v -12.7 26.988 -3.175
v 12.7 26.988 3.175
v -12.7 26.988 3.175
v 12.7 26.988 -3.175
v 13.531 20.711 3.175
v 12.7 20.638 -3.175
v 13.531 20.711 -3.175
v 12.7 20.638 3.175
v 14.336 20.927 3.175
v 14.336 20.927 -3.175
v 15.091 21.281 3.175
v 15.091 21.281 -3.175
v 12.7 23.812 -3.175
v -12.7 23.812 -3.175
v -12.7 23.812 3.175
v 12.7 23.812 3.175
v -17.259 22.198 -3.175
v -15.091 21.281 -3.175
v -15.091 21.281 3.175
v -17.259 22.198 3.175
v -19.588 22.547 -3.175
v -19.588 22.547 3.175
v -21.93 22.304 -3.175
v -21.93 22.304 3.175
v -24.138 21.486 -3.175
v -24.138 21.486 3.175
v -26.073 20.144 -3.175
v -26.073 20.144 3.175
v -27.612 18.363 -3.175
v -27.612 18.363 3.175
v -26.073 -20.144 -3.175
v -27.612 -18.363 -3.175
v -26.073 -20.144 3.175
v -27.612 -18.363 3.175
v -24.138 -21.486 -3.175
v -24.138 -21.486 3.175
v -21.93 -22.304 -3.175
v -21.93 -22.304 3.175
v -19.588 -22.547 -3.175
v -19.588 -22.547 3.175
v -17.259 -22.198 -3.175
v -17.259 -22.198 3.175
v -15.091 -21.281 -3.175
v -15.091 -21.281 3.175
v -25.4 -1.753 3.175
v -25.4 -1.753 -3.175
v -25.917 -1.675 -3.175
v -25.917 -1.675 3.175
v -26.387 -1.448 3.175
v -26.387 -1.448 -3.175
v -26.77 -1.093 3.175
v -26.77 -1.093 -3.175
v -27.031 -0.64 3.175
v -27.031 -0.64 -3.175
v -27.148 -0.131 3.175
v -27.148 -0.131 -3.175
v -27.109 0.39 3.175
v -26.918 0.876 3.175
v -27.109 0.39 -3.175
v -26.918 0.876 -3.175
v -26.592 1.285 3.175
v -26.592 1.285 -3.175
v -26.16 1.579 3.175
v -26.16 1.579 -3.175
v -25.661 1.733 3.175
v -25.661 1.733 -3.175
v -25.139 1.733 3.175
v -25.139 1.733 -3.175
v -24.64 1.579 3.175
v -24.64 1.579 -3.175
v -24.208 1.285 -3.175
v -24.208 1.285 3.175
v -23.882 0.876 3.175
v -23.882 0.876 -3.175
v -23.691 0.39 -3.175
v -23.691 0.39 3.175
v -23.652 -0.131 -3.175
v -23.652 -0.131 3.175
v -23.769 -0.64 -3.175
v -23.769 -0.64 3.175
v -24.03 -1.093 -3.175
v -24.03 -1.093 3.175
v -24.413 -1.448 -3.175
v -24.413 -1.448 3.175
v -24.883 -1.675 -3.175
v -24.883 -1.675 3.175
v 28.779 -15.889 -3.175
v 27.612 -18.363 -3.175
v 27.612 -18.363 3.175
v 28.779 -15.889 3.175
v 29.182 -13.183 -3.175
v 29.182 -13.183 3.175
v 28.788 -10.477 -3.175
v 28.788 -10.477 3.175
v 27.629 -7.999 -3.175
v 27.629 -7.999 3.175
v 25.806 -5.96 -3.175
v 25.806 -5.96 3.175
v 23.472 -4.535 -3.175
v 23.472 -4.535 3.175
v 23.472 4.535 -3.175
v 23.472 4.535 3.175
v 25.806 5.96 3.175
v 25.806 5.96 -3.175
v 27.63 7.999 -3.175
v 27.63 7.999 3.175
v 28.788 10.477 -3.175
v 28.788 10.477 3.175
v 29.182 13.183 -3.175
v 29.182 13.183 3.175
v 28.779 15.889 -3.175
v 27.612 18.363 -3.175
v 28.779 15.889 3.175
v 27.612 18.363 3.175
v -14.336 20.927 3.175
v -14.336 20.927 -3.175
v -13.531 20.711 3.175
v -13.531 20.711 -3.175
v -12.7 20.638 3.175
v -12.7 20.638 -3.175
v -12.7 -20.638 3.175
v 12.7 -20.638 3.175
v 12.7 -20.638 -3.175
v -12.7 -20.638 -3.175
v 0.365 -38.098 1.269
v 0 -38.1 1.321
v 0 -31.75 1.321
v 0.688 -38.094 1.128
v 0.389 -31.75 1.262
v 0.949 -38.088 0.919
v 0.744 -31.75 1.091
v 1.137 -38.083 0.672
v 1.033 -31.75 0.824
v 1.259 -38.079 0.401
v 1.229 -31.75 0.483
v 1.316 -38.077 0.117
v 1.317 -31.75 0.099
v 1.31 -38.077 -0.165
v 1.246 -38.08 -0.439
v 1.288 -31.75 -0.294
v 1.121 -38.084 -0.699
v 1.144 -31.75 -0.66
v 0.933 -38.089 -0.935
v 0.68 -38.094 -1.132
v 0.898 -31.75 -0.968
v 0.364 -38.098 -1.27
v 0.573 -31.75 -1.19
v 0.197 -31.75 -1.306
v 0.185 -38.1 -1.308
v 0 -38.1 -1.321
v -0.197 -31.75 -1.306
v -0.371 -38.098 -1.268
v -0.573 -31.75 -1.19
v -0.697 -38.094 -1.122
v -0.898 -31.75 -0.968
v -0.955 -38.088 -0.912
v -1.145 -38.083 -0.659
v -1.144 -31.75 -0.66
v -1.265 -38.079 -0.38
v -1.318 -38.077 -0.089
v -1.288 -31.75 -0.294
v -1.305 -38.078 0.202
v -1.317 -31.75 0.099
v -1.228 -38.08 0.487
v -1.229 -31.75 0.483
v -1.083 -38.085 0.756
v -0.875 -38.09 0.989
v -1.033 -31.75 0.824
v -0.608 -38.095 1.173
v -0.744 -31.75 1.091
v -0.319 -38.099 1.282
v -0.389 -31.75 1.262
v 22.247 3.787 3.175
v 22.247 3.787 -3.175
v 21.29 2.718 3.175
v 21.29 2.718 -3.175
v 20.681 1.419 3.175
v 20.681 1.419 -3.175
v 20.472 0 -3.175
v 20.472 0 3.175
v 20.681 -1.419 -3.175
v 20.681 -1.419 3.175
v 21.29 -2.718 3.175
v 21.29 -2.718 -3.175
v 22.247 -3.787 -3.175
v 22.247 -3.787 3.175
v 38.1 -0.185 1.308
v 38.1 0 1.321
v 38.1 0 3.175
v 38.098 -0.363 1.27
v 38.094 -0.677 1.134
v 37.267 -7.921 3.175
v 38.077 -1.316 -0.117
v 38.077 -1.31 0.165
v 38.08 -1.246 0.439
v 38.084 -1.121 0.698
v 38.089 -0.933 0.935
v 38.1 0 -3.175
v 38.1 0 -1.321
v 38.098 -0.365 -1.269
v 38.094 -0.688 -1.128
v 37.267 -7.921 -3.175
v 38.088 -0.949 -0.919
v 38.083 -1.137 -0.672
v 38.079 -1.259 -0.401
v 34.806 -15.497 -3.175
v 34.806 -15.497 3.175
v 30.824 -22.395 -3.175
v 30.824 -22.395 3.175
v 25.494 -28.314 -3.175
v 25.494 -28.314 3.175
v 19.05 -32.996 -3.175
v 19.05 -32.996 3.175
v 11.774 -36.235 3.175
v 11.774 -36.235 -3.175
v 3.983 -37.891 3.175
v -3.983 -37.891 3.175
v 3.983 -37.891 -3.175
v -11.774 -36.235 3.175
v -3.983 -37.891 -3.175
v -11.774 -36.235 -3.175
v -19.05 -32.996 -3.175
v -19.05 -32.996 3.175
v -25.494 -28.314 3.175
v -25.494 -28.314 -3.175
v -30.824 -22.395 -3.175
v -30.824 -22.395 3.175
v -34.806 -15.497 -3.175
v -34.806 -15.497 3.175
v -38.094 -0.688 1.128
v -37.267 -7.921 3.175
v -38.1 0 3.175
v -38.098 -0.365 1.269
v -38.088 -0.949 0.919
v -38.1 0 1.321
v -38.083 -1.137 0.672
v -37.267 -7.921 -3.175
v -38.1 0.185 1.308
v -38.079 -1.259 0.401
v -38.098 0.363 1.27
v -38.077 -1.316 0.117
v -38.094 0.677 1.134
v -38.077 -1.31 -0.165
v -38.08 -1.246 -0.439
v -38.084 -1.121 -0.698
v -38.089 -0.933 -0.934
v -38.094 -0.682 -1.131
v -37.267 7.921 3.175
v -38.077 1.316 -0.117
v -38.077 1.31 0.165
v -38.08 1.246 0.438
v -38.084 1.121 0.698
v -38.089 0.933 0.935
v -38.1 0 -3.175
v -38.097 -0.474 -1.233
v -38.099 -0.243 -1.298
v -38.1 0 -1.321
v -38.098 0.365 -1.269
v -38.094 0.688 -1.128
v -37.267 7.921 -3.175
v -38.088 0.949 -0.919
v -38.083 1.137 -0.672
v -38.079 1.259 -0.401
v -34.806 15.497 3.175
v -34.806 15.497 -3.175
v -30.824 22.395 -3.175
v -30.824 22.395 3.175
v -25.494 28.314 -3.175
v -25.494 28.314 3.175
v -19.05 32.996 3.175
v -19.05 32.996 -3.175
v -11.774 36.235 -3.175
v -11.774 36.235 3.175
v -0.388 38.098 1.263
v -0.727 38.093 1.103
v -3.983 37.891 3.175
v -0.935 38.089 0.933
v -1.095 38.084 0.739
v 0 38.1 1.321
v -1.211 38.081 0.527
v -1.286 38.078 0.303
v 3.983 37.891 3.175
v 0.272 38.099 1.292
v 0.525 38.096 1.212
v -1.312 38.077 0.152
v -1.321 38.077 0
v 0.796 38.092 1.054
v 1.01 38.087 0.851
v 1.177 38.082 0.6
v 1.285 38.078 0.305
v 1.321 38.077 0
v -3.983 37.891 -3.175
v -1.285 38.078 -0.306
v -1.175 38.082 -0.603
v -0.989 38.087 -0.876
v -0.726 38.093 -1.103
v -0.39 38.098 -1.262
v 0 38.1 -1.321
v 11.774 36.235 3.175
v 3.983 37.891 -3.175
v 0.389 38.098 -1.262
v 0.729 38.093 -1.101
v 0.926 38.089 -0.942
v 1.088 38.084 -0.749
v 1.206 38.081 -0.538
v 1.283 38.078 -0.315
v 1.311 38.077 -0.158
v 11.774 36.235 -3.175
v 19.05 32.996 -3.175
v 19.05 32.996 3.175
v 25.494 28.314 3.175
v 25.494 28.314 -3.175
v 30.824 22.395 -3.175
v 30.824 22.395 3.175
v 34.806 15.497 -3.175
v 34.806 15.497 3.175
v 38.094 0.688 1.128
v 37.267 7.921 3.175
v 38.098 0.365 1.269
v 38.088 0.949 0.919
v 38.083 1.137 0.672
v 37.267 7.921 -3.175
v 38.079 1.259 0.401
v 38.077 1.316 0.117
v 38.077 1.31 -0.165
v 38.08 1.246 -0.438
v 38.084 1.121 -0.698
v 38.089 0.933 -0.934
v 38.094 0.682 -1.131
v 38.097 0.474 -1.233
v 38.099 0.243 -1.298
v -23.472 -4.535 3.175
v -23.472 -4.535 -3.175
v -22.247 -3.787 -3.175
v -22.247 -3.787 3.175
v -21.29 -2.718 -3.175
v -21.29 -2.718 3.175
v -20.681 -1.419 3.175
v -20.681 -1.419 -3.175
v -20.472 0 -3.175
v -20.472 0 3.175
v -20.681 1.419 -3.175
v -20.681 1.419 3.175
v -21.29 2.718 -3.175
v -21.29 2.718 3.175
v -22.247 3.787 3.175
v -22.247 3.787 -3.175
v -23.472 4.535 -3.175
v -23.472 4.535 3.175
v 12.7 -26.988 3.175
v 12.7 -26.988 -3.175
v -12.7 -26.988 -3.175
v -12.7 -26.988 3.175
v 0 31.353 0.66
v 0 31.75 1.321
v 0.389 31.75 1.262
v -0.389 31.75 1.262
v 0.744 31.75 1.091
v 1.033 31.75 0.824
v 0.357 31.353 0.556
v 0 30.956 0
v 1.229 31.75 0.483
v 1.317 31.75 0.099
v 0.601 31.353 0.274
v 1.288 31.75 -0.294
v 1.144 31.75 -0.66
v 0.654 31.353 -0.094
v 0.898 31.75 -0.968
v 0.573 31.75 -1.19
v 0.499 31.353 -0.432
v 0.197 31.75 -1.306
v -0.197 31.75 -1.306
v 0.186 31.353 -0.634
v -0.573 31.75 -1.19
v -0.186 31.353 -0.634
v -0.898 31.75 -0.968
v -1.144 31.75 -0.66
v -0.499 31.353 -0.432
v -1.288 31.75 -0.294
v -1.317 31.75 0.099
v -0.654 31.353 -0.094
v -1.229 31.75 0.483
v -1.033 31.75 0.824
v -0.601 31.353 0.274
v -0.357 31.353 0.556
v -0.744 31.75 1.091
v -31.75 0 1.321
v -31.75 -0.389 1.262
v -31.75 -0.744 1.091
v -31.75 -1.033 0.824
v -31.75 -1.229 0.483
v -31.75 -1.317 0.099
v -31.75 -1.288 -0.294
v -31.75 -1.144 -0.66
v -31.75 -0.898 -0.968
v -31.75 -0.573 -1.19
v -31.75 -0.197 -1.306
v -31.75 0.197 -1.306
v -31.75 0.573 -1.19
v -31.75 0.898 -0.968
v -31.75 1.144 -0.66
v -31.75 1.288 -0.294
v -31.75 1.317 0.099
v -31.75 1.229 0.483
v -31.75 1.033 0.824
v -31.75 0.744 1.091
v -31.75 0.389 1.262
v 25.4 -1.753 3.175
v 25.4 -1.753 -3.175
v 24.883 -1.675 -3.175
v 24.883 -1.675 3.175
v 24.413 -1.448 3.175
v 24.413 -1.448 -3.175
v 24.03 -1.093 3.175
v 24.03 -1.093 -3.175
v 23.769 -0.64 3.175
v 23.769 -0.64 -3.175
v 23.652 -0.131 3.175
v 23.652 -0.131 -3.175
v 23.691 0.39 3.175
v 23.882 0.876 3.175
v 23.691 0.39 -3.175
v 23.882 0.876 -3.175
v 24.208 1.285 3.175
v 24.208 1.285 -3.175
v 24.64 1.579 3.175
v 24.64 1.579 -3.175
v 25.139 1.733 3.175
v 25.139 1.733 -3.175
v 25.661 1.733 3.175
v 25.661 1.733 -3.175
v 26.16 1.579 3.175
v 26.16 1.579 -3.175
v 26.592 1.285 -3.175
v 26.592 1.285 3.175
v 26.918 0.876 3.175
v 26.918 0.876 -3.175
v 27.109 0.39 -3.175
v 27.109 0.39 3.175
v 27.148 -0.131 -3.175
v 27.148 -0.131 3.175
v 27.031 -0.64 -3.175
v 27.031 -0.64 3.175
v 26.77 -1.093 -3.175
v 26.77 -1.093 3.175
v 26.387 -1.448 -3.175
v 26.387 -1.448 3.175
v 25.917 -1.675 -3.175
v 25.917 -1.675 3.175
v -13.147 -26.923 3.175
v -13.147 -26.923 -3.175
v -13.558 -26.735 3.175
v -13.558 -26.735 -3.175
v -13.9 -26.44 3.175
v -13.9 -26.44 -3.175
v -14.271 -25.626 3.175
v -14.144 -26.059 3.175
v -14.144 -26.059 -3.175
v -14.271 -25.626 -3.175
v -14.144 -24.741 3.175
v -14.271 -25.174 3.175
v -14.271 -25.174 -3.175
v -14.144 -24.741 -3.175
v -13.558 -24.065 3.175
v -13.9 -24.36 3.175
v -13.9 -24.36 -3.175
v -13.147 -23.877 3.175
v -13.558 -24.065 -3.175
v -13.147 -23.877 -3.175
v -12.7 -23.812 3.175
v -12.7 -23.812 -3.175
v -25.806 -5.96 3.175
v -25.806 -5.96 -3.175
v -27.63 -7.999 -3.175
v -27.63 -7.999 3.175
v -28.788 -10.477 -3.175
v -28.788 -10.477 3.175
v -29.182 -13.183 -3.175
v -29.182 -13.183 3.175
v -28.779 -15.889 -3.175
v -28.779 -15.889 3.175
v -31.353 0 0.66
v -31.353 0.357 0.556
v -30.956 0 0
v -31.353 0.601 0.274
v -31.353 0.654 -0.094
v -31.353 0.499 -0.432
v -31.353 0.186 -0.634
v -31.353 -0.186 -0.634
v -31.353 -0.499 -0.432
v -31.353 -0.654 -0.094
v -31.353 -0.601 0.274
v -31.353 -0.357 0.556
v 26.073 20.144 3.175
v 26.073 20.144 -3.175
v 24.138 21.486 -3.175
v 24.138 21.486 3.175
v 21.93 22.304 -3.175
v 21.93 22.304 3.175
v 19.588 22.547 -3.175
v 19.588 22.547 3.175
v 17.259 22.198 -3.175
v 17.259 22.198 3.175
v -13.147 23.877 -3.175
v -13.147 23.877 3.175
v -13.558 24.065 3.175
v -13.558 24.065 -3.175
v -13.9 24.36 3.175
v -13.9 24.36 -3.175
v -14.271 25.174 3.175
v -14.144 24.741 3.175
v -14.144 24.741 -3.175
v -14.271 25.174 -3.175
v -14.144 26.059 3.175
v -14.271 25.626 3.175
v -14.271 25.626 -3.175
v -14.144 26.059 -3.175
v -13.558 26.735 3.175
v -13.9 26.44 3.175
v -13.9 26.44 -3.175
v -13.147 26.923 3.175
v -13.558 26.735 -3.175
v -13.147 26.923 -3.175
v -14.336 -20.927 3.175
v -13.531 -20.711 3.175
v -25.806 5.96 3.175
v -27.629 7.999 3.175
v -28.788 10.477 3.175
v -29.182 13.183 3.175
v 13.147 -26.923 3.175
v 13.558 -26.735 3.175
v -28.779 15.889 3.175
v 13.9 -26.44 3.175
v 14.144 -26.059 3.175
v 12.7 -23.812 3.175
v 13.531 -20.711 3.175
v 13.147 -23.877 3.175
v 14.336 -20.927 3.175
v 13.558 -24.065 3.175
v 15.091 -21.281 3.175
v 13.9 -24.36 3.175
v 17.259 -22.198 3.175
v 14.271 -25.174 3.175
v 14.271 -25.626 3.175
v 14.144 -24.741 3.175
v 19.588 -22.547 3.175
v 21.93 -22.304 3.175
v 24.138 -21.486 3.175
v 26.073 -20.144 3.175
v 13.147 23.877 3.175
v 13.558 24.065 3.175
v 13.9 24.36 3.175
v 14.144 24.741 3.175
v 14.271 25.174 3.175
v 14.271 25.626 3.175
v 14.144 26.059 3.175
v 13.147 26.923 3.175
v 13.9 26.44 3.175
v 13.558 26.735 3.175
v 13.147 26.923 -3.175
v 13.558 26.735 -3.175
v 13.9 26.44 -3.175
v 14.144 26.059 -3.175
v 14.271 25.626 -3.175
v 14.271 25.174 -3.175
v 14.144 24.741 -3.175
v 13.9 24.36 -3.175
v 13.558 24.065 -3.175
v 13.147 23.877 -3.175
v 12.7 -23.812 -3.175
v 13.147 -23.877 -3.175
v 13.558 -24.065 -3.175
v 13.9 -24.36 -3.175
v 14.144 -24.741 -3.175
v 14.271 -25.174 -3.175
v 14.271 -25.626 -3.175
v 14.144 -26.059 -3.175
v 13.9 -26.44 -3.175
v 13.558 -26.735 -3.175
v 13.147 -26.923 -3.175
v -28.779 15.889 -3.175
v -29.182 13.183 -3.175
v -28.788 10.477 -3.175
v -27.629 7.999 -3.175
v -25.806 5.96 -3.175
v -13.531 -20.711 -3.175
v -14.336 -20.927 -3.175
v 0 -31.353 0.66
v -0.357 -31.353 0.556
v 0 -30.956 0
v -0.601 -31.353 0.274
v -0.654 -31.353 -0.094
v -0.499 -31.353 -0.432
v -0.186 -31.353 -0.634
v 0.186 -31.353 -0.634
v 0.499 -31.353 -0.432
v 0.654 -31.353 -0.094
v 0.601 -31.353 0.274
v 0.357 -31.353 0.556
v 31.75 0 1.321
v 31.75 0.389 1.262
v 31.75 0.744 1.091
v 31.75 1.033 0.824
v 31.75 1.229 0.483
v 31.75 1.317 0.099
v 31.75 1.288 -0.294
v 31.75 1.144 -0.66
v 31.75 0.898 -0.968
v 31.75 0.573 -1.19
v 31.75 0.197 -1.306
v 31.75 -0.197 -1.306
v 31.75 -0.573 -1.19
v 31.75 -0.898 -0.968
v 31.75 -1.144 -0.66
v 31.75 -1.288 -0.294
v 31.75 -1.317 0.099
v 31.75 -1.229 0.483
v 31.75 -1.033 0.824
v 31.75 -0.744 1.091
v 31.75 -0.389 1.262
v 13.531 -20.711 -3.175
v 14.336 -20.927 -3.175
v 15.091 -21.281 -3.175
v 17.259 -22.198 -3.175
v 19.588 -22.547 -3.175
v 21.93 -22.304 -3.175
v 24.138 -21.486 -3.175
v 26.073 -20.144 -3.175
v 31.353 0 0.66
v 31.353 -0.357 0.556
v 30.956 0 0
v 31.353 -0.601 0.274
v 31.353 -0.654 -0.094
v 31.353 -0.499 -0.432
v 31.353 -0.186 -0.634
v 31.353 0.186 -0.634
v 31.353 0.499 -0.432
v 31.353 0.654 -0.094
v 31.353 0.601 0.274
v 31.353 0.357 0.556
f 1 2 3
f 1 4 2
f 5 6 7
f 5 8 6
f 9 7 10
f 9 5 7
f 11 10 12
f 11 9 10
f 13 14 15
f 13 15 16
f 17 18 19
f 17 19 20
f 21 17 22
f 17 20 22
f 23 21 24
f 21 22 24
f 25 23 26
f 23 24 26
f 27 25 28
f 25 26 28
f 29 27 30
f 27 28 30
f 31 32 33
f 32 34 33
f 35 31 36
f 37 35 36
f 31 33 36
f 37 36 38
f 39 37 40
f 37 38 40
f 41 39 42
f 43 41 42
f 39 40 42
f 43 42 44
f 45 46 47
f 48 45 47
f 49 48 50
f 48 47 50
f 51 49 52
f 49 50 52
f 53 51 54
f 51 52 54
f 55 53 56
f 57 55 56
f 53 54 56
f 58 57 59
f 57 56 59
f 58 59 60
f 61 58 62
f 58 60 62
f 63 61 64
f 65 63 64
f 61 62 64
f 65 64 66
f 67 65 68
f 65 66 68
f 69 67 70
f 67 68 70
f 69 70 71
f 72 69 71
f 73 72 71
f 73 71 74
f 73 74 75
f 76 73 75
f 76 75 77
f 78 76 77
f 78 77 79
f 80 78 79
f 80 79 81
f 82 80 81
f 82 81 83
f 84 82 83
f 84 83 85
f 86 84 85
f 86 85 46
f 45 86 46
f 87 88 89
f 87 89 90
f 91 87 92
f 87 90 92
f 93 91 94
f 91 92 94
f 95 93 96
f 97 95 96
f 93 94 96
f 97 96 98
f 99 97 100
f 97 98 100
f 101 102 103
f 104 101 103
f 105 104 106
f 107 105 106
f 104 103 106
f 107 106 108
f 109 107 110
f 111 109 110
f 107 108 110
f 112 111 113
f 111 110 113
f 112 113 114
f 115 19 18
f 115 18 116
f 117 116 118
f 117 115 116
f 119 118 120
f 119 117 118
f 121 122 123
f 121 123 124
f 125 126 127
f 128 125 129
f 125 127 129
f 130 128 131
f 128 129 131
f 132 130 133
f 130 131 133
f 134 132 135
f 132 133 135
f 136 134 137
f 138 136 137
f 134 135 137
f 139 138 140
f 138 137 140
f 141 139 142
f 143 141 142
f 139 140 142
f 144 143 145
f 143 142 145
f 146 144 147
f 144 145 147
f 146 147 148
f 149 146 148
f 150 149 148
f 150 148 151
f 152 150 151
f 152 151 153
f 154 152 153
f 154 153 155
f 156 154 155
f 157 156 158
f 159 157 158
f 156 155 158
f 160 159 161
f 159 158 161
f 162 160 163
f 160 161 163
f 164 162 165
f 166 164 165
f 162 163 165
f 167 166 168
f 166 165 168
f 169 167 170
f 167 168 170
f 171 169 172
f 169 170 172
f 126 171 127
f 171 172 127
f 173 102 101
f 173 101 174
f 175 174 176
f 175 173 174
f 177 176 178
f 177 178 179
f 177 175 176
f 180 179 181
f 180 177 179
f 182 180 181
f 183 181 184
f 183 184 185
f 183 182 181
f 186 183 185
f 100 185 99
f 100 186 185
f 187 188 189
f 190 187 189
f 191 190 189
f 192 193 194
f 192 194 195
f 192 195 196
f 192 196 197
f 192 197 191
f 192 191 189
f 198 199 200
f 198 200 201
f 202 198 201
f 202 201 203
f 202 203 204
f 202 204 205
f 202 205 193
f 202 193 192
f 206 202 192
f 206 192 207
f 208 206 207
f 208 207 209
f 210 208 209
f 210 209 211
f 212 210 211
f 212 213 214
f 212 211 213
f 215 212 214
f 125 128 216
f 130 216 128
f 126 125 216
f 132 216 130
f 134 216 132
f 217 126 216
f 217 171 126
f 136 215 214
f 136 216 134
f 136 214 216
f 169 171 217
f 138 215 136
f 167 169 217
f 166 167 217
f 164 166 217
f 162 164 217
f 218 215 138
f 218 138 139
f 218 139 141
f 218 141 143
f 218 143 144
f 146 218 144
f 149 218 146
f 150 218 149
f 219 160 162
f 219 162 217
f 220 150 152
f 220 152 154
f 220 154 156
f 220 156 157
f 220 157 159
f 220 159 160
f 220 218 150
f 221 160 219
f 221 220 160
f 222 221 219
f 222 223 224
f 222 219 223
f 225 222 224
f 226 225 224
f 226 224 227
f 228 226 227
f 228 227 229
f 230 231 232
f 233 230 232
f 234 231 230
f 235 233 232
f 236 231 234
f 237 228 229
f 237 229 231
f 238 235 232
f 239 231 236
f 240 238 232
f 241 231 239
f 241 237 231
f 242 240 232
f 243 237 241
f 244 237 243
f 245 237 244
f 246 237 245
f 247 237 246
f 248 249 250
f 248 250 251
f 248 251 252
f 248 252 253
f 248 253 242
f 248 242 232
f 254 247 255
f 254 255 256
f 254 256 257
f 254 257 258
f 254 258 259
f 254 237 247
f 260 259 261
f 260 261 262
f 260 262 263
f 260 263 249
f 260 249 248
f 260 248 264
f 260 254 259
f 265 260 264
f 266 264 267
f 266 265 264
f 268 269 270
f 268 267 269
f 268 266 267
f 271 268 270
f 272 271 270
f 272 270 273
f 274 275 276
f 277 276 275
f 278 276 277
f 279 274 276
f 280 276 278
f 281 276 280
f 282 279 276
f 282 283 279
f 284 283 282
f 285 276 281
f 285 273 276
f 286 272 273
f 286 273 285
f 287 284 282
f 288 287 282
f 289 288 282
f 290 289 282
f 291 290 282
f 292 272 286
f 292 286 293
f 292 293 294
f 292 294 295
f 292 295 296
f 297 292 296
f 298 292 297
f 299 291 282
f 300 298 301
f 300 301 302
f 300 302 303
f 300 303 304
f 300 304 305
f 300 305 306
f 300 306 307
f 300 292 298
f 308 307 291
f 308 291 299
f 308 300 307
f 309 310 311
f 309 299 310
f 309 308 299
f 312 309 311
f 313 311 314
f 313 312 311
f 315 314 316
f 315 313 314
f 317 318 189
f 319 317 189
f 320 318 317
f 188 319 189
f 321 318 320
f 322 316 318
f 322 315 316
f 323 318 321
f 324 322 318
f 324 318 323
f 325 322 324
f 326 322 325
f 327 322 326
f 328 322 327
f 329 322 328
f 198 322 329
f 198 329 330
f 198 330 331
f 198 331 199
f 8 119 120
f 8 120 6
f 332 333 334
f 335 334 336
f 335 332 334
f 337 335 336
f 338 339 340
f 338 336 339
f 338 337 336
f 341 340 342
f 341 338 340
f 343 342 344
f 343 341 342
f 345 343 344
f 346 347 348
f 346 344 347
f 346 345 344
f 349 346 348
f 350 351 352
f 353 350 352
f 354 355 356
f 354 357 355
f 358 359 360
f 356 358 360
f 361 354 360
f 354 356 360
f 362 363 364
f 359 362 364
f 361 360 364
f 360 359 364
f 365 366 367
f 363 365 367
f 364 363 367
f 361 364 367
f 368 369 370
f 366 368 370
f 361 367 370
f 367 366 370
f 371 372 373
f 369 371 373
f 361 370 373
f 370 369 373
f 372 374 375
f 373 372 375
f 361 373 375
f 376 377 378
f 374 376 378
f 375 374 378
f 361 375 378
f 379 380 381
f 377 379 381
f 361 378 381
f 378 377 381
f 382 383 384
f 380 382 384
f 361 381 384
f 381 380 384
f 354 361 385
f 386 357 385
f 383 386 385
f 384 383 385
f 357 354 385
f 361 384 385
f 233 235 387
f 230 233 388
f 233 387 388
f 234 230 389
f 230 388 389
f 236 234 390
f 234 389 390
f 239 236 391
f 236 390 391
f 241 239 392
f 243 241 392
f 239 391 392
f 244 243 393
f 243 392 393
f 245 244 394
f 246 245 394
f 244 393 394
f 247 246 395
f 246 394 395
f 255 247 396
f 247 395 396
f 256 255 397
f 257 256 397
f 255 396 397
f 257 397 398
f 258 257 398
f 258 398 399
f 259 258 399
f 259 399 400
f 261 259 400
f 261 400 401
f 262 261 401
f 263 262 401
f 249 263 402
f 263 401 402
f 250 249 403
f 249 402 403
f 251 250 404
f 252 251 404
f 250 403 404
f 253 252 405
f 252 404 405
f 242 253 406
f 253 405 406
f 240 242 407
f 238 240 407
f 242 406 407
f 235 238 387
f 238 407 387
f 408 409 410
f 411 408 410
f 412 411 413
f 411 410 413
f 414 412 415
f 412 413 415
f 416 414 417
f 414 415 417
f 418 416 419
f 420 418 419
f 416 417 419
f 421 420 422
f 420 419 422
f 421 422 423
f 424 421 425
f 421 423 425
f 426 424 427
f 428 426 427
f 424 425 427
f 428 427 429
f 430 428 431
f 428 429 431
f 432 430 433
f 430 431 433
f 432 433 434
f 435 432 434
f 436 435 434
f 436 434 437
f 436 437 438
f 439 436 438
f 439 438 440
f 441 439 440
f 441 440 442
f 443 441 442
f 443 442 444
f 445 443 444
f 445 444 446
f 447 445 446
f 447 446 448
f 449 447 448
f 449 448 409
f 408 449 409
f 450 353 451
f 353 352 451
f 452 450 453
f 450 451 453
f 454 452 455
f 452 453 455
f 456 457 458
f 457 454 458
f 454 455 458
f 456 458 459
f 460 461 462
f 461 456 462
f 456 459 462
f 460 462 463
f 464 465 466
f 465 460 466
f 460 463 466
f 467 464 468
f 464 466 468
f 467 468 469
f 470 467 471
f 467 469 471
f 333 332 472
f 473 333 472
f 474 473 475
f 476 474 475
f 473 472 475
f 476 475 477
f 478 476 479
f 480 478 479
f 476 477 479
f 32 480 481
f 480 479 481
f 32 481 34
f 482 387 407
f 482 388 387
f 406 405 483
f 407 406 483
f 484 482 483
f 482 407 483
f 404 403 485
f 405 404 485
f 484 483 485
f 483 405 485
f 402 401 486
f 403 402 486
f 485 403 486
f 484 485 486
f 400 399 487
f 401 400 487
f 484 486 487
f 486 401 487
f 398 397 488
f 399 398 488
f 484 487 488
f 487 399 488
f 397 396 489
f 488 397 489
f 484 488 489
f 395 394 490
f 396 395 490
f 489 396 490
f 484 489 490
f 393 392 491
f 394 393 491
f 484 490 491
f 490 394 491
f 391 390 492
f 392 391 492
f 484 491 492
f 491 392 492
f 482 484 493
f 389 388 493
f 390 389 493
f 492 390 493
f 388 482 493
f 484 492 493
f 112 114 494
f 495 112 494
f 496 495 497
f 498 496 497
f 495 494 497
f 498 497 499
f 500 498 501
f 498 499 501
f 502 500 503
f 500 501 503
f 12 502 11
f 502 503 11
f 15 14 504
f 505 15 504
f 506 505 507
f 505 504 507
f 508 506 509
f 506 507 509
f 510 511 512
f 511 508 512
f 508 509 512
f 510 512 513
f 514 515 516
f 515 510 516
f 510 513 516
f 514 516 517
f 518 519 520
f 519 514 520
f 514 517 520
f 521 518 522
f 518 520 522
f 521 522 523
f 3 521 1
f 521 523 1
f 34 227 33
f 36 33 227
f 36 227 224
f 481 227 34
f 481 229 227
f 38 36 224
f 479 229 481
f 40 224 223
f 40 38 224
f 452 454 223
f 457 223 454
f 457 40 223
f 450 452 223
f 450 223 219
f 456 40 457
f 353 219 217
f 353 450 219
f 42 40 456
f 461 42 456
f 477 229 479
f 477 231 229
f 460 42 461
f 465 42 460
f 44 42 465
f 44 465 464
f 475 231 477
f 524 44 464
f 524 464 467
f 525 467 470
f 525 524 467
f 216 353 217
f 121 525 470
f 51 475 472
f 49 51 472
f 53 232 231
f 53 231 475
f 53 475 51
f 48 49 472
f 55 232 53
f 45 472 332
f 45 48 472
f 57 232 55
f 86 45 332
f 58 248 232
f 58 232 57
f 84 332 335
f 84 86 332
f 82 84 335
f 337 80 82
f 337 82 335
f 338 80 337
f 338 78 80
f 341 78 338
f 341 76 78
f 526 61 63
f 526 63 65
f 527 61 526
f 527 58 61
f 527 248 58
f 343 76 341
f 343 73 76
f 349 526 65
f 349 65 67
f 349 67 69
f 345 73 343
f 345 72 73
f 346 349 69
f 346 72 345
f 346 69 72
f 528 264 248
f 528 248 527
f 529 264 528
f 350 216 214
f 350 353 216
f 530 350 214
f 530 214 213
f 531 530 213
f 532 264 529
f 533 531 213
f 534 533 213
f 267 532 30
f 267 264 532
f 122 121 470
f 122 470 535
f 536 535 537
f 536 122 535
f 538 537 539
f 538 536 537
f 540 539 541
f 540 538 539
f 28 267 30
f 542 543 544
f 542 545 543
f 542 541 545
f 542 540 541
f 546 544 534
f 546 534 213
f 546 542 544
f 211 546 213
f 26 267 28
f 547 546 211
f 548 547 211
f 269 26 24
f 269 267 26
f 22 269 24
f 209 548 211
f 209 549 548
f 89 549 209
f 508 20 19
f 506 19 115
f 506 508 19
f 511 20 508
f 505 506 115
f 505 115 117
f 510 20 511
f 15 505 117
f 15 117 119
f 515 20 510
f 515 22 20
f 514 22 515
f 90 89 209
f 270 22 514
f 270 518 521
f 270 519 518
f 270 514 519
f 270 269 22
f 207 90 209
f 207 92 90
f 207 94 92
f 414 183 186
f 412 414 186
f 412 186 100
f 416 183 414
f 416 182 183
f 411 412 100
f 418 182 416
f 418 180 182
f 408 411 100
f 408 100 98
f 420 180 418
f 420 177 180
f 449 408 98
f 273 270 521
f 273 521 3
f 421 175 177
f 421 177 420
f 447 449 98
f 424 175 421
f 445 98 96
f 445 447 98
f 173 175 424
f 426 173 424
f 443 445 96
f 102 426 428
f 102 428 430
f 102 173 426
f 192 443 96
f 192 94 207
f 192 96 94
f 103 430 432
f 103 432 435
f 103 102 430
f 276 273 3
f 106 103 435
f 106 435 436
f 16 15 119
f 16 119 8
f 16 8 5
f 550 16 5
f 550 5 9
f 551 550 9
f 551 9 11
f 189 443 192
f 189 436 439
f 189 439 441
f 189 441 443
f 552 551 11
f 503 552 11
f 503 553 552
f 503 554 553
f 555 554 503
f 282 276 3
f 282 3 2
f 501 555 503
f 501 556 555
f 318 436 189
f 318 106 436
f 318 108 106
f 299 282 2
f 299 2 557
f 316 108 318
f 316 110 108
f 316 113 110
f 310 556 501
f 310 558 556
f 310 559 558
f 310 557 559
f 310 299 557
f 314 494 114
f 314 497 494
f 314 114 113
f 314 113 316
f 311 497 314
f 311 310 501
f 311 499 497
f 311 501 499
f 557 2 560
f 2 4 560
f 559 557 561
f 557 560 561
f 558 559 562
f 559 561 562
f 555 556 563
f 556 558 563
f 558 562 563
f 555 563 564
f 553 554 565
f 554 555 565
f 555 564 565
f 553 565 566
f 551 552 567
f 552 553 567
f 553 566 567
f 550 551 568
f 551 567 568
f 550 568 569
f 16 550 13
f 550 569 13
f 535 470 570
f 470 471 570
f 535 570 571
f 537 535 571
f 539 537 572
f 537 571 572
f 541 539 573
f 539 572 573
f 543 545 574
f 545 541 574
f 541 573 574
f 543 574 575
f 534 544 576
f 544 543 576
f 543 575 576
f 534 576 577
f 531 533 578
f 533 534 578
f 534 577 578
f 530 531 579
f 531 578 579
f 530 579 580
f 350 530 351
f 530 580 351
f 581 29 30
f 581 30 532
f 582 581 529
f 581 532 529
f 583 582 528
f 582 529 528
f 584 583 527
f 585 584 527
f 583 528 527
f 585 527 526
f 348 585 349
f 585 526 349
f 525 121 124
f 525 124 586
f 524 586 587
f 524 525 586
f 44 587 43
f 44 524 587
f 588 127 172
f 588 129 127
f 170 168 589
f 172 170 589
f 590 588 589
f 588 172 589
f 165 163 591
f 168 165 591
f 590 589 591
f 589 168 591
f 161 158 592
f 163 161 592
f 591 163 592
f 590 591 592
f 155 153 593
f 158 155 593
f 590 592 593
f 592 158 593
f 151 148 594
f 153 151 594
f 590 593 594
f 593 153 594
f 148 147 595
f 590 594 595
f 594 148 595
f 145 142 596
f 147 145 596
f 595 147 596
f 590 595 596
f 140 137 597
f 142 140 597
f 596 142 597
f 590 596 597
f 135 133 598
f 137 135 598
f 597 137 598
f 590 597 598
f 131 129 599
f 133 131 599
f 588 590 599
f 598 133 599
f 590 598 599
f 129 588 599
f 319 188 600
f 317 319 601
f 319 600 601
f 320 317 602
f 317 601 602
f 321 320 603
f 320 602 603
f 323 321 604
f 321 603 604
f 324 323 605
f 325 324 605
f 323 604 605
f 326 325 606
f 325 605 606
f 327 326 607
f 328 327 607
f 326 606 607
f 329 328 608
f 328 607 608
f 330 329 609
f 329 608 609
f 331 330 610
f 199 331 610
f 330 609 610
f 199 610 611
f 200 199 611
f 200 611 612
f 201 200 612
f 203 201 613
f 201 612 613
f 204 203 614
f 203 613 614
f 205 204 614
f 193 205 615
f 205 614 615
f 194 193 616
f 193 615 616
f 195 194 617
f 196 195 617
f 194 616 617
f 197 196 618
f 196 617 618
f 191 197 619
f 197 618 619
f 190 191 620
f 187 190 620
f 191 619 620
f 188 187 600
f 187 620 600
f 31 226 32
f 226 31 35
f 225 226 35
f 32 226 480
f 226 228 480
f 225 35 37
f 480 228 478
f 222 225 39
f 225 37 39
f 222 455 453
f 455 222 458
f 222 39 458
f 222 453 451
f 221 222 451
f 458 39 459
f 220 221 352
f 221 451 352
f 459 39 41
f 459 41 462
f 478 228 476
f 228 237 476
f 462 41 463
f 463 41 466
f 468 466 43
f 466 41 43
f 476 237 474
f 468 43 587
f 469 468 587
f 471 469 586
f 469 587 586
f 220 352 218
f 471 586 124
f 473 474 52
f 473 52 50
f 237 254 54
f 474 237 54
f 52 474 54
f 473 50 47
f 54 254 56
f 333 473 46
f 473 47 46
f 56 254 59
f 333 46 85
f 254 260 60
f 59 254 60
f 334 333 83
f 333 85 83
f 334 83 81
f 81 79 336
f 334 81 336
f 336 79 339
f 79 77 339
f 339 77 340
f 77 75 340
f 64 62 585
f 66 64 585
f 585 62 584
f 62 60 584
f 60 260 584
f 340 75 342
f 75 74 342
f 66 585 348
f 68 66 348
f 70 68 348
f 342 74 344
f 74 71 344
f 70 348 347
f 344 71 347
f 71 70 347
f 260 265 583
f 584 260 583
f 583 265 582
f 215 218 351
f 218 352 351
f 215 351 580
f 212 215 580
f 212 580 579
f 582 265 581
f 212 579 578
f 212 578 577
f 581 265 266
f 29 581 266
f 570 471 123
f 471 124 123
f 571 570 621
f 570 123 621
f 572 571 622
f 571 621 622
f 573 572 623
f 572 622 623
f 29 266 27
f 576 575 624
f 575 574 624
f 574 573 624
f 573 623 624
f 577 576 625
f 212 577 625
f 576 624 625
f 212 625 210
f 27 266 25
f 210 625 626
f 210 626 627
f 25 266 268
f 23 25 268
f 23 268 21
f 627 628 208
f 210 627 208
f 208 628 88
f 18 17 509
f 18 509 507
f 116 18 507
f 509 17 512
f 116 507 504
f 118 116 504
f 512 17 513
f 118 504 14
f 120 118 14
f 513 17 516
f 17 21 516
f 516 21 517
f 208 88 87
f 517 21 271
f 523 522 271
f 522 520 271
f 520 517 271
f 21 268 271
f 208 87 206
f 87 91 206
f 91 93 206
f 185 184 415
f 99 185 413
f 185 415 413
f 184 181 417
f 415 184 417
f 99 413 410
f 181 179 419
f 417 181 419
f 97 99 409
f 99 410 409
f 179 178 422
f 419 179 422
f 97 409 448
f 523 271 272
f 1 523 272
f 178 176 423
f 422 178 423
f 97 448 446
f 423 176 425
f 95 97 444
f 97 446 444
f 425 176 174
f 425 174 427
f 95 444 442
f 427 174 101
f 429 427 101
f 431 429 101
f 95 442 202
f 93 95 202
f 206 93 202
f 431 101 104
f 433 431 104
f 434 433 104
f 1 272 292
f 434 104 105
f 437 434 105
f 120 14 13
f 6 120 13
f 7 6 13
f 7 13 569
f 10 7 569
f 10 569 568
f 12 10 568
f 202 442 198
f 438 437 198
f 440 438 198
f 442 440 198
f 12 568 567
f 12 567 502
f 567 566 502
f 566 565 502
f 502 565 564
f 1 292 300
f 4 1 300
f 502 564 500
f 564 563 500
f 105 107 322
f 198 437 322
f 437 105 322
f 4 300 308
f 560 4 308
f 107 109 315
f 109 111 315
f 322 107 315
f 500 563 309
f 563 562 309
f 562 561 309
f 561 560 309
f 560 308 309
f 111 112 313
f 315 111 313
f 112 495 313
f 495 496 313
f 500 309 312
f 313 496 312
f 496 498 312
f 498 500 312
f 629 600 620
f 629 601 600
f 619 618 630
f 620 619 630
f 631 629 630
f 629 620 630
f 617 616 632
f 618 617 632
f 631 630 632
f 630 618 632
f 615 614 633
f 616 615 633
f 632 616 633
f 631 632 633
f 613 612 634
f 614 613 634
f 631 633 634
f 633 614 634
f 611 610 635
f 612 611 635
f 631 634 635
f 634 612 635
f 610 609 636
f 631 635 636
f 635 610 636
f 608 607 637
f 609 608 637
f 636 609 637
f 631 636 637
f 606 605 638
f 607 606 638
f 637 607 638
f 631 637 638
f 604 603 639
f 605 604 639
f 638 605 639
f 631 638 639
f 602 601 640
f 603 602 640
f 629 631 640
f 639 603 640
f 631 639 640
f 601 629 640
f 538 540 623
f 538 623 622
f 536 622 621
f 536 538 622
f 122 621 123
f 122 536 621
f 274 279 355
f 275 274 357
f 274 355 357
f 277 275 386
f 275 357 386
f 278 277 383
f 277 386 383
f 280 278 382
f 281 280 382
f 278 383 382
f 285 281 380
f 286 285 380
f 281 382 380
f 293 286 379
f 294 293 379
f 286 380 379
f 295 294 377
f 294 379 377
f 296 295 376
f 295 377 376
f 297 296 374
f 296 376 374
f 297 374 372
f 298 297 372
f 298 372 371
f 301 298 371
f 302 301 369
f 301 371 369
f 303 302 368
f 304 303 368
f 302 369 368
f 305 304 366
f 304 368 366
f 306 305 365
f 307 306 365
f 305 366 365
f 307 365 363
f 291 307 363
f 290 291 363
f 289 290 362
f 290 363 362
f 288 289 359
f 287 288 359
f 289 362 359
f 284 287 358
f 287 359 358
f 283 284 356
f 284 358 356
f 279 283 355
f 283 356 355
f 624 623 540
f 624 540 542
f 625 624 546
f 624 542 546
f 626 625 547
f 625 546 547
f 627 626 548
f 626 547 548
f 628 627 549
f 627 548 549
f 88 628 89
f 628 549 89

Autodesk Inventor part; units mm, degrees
ref_plane "YZ Plane" through (0, 0, 0) normal (1, 0, 0) x (0, 1, 0)
ref_plane "XY Plane" through (0, 0, 0) normal (0, 0, 1) x (1, 0, 0)
sketch "Sketch1" plane through (0, 0, 0) normal (0, 0, 1) x (1, 0, 0)
  circle A0 centre (0, 0) radius 38.1
  line L0 (-12.7, 25.4) -> (12.7, 25.4) construction
  line L1 (-12.7, 23.8125) -> (12.7, 23.8125)
  line L2 (12.7, 26.9875) -> (-12.7, 26.9875)
  arc A1 (-12.7, 26.9875) -> (-12.7, 23.8125) centre (-12.7, 25.4) ccw
  arc A2 (12.7, 23.8125) -> (12.7, 26.9875) centre (12.7, 25.4) ccw
  line L3 (0, 38.1) -> (0, -38.1) construction
  line L4 (-38.1, 0) -> (38.1, 0) construction
  line L5 (-12.7, -25.4) -> (12.7, -25.4) construction
  line L6 (-12.7, -23.8125) -> (12.7, -23.8125)
  line L7 (12.7, -26.9875) -> (-12.7, -26.9875)
  arc A3 (-12.7, -23.8125) -> (-12.7, -26.9875) centre (-12.7, -25.4) ccw
  arc A4 (12.7, -26.9875) -> (12.7, -23.8125) centre (12.7, -25.4) ccw
  point P0 (0, 25.4)
  point P1 (0, -25.4)
  dimension "d0" = 76.2
  dimension "d1" = 25.4
  dimension "d2" = 1.5875
  dimension "d3" = 25.4
extrude "Extrusion1" add sketch "Sketch1" along normal mid plane 6.35
sketch "Sketch2" plane through (0, 0, 3.175) normal (0, 0, 1) x (1, 0, 0)
  circle A0 centre (0, 0) radius 38.1 construction
  line L0 (0, 38.1) -> (0, -38.1) construction
  point P0 (-25.4, 0)
  point P1 (25.4, 0)
  dimension "d8" = 25.4
hole "Hole1" at (-25.4, 0, 3.175) at (25.4, 0, 3.175) direction (0, 0, -1) diameter 3.5052 end through all
sketch "Sketch3" plane through (0, 0, 3.175) normal (0, 0, 1) x (1, 0, 0)
  circle A0 centre (25.4, 0) radius 1.7526 construction
  circle A1 centre (-25.4, 0) radius 1.7526 construction
  circle A2 centre (0, 0) radius 38.1 construction
  line L0 (12.7, -26.9875) -> (-12.7, -26.9875) construction
  arc A3 (-12.7, -23.8125) -> (-12.7, -26.9875) centre (-12.7, -25.4) ccw construction
  line L1 (-12.7, -23.8125) -> (12.7, -23.8125) construction
  arc A4 (12.7, -26.9875) -> (12.7, -23.8125) centre (12.7, -25.4) ccw construction
  arc A5 (-12.7, 26.9875) -> (-12.7, 23.8125) centre (-12.7, 25.4) ccw construction
  line L2 (-12.7, 26.9875) -> (12.7, 26.9875) construction
  arc A6 (12.7, 23.8125) -> (12.7, 26.9875) centre (12.7, 25.4) ccw construction
  line L3 (12.7, 23.8125) -> (-12.7, 23.8125) construction
  line L4 (12.7, 30.1625) -> (-12.7, 30.1625)
  arc A7 (-12.7, 30.1625) -> (-12.7, 20.6375) centre (-12.7, 25.4) ccw
  line L5 (-12.7, 20.6375) -> (12.7, 20.6375)
  arc A8 (12.7, 20.6375) -> (12.7, 30.1625) centre (12.7, 25.4) ccw
  circle A9 centre (-25.4, 0) radius 4.9276
  circle A10 centre (25.4, 0) radius 4.9276
  line L6 (12.7, -20.6375) -> (-12.7, -20.6375)
  arc A11 (-12.7, -20.6375) -> (-12.7, -30.1625) centre (-12.7, -25.4) ccw
  line L7 (-12.7, -30.1625) -> (12.7, -30.1625)
  arc A12 (12.7, -30.1625) -> (12.7, -20.6375) centre (12.7, -25.4) ccw
  circle A13 centre (0, 0) radius 33.1606
  arc A14 (-27.6122, 18.3627) -> (-23.4717, 4.5346) centre (-19.8006, 13.1678) ccw
  arc A15 (-23.4717, -4.5346) -> (-27.6122, -18.3627) centre (-19.8006, -13.1678) ccw
  arc A16 (23.4717, 4.5346) -> (27.6122, 18.3627) centre (19.8006, 13.1678) ccw
  arc A17 (27.6122, -18.3627) -> (23.4717, -4.5346) centre (19.8006, -13.1678) ccw
  arc A18 (-27.6122, -18.3627) -> (-15.0909, -21.2812) centre (-19.8006, -13.1678) ccw
  arc A19 (15.0909, -21.2812) -> (27.6122, -18.3627) centre (19.8006, -13.1678) ccw
  arc A20 (-15.0909, 21.2812) -> (-27.6122, 18.3627) centre (-19.8006, 13.1678) ccw
  arc A21 (27.6122, 18.3627) -> (15.0909, 21.2812) centre (19.8006, 13.1678) ccw
  dimension "d16" = 3.175
  dimension "d17" = 3.175
  dimension "d18" = 3.175
  dimension "d19" = 3.175
extrude "Extrusion2" cut sketch "Sketch3" against normal through all contours A21 A16 A10 A17 A19 A12 L6 A11 A18 A15 A9 A14 A20 A7 L5 A8
ref_plane "Work Plane1" through (0, 38.1, 0) normal (0, 1, 0) x (-1, 0, 0)
sketch "Sketch4" plane through (0, 38.1, 0) normal (0, 1, 0) x (-1, 0, 0)
  point P0 (0, 0)
  point P1 (0, 0)
hole "Hole2" at (0, 38.1, 0) direction (0, -1, 0) diameter 2.6416 depth 6.35 tip angle 118 thread size "6-32 UNC" class "2B" standard "ANSI Unified Screw Threads"
pattern_circular "Circular Pattern1" count 4 over 360 about axis through (0, 0, 0) along (0, 0, 1) of "Hole2"
properties part number "DeploymentBulkhead"
